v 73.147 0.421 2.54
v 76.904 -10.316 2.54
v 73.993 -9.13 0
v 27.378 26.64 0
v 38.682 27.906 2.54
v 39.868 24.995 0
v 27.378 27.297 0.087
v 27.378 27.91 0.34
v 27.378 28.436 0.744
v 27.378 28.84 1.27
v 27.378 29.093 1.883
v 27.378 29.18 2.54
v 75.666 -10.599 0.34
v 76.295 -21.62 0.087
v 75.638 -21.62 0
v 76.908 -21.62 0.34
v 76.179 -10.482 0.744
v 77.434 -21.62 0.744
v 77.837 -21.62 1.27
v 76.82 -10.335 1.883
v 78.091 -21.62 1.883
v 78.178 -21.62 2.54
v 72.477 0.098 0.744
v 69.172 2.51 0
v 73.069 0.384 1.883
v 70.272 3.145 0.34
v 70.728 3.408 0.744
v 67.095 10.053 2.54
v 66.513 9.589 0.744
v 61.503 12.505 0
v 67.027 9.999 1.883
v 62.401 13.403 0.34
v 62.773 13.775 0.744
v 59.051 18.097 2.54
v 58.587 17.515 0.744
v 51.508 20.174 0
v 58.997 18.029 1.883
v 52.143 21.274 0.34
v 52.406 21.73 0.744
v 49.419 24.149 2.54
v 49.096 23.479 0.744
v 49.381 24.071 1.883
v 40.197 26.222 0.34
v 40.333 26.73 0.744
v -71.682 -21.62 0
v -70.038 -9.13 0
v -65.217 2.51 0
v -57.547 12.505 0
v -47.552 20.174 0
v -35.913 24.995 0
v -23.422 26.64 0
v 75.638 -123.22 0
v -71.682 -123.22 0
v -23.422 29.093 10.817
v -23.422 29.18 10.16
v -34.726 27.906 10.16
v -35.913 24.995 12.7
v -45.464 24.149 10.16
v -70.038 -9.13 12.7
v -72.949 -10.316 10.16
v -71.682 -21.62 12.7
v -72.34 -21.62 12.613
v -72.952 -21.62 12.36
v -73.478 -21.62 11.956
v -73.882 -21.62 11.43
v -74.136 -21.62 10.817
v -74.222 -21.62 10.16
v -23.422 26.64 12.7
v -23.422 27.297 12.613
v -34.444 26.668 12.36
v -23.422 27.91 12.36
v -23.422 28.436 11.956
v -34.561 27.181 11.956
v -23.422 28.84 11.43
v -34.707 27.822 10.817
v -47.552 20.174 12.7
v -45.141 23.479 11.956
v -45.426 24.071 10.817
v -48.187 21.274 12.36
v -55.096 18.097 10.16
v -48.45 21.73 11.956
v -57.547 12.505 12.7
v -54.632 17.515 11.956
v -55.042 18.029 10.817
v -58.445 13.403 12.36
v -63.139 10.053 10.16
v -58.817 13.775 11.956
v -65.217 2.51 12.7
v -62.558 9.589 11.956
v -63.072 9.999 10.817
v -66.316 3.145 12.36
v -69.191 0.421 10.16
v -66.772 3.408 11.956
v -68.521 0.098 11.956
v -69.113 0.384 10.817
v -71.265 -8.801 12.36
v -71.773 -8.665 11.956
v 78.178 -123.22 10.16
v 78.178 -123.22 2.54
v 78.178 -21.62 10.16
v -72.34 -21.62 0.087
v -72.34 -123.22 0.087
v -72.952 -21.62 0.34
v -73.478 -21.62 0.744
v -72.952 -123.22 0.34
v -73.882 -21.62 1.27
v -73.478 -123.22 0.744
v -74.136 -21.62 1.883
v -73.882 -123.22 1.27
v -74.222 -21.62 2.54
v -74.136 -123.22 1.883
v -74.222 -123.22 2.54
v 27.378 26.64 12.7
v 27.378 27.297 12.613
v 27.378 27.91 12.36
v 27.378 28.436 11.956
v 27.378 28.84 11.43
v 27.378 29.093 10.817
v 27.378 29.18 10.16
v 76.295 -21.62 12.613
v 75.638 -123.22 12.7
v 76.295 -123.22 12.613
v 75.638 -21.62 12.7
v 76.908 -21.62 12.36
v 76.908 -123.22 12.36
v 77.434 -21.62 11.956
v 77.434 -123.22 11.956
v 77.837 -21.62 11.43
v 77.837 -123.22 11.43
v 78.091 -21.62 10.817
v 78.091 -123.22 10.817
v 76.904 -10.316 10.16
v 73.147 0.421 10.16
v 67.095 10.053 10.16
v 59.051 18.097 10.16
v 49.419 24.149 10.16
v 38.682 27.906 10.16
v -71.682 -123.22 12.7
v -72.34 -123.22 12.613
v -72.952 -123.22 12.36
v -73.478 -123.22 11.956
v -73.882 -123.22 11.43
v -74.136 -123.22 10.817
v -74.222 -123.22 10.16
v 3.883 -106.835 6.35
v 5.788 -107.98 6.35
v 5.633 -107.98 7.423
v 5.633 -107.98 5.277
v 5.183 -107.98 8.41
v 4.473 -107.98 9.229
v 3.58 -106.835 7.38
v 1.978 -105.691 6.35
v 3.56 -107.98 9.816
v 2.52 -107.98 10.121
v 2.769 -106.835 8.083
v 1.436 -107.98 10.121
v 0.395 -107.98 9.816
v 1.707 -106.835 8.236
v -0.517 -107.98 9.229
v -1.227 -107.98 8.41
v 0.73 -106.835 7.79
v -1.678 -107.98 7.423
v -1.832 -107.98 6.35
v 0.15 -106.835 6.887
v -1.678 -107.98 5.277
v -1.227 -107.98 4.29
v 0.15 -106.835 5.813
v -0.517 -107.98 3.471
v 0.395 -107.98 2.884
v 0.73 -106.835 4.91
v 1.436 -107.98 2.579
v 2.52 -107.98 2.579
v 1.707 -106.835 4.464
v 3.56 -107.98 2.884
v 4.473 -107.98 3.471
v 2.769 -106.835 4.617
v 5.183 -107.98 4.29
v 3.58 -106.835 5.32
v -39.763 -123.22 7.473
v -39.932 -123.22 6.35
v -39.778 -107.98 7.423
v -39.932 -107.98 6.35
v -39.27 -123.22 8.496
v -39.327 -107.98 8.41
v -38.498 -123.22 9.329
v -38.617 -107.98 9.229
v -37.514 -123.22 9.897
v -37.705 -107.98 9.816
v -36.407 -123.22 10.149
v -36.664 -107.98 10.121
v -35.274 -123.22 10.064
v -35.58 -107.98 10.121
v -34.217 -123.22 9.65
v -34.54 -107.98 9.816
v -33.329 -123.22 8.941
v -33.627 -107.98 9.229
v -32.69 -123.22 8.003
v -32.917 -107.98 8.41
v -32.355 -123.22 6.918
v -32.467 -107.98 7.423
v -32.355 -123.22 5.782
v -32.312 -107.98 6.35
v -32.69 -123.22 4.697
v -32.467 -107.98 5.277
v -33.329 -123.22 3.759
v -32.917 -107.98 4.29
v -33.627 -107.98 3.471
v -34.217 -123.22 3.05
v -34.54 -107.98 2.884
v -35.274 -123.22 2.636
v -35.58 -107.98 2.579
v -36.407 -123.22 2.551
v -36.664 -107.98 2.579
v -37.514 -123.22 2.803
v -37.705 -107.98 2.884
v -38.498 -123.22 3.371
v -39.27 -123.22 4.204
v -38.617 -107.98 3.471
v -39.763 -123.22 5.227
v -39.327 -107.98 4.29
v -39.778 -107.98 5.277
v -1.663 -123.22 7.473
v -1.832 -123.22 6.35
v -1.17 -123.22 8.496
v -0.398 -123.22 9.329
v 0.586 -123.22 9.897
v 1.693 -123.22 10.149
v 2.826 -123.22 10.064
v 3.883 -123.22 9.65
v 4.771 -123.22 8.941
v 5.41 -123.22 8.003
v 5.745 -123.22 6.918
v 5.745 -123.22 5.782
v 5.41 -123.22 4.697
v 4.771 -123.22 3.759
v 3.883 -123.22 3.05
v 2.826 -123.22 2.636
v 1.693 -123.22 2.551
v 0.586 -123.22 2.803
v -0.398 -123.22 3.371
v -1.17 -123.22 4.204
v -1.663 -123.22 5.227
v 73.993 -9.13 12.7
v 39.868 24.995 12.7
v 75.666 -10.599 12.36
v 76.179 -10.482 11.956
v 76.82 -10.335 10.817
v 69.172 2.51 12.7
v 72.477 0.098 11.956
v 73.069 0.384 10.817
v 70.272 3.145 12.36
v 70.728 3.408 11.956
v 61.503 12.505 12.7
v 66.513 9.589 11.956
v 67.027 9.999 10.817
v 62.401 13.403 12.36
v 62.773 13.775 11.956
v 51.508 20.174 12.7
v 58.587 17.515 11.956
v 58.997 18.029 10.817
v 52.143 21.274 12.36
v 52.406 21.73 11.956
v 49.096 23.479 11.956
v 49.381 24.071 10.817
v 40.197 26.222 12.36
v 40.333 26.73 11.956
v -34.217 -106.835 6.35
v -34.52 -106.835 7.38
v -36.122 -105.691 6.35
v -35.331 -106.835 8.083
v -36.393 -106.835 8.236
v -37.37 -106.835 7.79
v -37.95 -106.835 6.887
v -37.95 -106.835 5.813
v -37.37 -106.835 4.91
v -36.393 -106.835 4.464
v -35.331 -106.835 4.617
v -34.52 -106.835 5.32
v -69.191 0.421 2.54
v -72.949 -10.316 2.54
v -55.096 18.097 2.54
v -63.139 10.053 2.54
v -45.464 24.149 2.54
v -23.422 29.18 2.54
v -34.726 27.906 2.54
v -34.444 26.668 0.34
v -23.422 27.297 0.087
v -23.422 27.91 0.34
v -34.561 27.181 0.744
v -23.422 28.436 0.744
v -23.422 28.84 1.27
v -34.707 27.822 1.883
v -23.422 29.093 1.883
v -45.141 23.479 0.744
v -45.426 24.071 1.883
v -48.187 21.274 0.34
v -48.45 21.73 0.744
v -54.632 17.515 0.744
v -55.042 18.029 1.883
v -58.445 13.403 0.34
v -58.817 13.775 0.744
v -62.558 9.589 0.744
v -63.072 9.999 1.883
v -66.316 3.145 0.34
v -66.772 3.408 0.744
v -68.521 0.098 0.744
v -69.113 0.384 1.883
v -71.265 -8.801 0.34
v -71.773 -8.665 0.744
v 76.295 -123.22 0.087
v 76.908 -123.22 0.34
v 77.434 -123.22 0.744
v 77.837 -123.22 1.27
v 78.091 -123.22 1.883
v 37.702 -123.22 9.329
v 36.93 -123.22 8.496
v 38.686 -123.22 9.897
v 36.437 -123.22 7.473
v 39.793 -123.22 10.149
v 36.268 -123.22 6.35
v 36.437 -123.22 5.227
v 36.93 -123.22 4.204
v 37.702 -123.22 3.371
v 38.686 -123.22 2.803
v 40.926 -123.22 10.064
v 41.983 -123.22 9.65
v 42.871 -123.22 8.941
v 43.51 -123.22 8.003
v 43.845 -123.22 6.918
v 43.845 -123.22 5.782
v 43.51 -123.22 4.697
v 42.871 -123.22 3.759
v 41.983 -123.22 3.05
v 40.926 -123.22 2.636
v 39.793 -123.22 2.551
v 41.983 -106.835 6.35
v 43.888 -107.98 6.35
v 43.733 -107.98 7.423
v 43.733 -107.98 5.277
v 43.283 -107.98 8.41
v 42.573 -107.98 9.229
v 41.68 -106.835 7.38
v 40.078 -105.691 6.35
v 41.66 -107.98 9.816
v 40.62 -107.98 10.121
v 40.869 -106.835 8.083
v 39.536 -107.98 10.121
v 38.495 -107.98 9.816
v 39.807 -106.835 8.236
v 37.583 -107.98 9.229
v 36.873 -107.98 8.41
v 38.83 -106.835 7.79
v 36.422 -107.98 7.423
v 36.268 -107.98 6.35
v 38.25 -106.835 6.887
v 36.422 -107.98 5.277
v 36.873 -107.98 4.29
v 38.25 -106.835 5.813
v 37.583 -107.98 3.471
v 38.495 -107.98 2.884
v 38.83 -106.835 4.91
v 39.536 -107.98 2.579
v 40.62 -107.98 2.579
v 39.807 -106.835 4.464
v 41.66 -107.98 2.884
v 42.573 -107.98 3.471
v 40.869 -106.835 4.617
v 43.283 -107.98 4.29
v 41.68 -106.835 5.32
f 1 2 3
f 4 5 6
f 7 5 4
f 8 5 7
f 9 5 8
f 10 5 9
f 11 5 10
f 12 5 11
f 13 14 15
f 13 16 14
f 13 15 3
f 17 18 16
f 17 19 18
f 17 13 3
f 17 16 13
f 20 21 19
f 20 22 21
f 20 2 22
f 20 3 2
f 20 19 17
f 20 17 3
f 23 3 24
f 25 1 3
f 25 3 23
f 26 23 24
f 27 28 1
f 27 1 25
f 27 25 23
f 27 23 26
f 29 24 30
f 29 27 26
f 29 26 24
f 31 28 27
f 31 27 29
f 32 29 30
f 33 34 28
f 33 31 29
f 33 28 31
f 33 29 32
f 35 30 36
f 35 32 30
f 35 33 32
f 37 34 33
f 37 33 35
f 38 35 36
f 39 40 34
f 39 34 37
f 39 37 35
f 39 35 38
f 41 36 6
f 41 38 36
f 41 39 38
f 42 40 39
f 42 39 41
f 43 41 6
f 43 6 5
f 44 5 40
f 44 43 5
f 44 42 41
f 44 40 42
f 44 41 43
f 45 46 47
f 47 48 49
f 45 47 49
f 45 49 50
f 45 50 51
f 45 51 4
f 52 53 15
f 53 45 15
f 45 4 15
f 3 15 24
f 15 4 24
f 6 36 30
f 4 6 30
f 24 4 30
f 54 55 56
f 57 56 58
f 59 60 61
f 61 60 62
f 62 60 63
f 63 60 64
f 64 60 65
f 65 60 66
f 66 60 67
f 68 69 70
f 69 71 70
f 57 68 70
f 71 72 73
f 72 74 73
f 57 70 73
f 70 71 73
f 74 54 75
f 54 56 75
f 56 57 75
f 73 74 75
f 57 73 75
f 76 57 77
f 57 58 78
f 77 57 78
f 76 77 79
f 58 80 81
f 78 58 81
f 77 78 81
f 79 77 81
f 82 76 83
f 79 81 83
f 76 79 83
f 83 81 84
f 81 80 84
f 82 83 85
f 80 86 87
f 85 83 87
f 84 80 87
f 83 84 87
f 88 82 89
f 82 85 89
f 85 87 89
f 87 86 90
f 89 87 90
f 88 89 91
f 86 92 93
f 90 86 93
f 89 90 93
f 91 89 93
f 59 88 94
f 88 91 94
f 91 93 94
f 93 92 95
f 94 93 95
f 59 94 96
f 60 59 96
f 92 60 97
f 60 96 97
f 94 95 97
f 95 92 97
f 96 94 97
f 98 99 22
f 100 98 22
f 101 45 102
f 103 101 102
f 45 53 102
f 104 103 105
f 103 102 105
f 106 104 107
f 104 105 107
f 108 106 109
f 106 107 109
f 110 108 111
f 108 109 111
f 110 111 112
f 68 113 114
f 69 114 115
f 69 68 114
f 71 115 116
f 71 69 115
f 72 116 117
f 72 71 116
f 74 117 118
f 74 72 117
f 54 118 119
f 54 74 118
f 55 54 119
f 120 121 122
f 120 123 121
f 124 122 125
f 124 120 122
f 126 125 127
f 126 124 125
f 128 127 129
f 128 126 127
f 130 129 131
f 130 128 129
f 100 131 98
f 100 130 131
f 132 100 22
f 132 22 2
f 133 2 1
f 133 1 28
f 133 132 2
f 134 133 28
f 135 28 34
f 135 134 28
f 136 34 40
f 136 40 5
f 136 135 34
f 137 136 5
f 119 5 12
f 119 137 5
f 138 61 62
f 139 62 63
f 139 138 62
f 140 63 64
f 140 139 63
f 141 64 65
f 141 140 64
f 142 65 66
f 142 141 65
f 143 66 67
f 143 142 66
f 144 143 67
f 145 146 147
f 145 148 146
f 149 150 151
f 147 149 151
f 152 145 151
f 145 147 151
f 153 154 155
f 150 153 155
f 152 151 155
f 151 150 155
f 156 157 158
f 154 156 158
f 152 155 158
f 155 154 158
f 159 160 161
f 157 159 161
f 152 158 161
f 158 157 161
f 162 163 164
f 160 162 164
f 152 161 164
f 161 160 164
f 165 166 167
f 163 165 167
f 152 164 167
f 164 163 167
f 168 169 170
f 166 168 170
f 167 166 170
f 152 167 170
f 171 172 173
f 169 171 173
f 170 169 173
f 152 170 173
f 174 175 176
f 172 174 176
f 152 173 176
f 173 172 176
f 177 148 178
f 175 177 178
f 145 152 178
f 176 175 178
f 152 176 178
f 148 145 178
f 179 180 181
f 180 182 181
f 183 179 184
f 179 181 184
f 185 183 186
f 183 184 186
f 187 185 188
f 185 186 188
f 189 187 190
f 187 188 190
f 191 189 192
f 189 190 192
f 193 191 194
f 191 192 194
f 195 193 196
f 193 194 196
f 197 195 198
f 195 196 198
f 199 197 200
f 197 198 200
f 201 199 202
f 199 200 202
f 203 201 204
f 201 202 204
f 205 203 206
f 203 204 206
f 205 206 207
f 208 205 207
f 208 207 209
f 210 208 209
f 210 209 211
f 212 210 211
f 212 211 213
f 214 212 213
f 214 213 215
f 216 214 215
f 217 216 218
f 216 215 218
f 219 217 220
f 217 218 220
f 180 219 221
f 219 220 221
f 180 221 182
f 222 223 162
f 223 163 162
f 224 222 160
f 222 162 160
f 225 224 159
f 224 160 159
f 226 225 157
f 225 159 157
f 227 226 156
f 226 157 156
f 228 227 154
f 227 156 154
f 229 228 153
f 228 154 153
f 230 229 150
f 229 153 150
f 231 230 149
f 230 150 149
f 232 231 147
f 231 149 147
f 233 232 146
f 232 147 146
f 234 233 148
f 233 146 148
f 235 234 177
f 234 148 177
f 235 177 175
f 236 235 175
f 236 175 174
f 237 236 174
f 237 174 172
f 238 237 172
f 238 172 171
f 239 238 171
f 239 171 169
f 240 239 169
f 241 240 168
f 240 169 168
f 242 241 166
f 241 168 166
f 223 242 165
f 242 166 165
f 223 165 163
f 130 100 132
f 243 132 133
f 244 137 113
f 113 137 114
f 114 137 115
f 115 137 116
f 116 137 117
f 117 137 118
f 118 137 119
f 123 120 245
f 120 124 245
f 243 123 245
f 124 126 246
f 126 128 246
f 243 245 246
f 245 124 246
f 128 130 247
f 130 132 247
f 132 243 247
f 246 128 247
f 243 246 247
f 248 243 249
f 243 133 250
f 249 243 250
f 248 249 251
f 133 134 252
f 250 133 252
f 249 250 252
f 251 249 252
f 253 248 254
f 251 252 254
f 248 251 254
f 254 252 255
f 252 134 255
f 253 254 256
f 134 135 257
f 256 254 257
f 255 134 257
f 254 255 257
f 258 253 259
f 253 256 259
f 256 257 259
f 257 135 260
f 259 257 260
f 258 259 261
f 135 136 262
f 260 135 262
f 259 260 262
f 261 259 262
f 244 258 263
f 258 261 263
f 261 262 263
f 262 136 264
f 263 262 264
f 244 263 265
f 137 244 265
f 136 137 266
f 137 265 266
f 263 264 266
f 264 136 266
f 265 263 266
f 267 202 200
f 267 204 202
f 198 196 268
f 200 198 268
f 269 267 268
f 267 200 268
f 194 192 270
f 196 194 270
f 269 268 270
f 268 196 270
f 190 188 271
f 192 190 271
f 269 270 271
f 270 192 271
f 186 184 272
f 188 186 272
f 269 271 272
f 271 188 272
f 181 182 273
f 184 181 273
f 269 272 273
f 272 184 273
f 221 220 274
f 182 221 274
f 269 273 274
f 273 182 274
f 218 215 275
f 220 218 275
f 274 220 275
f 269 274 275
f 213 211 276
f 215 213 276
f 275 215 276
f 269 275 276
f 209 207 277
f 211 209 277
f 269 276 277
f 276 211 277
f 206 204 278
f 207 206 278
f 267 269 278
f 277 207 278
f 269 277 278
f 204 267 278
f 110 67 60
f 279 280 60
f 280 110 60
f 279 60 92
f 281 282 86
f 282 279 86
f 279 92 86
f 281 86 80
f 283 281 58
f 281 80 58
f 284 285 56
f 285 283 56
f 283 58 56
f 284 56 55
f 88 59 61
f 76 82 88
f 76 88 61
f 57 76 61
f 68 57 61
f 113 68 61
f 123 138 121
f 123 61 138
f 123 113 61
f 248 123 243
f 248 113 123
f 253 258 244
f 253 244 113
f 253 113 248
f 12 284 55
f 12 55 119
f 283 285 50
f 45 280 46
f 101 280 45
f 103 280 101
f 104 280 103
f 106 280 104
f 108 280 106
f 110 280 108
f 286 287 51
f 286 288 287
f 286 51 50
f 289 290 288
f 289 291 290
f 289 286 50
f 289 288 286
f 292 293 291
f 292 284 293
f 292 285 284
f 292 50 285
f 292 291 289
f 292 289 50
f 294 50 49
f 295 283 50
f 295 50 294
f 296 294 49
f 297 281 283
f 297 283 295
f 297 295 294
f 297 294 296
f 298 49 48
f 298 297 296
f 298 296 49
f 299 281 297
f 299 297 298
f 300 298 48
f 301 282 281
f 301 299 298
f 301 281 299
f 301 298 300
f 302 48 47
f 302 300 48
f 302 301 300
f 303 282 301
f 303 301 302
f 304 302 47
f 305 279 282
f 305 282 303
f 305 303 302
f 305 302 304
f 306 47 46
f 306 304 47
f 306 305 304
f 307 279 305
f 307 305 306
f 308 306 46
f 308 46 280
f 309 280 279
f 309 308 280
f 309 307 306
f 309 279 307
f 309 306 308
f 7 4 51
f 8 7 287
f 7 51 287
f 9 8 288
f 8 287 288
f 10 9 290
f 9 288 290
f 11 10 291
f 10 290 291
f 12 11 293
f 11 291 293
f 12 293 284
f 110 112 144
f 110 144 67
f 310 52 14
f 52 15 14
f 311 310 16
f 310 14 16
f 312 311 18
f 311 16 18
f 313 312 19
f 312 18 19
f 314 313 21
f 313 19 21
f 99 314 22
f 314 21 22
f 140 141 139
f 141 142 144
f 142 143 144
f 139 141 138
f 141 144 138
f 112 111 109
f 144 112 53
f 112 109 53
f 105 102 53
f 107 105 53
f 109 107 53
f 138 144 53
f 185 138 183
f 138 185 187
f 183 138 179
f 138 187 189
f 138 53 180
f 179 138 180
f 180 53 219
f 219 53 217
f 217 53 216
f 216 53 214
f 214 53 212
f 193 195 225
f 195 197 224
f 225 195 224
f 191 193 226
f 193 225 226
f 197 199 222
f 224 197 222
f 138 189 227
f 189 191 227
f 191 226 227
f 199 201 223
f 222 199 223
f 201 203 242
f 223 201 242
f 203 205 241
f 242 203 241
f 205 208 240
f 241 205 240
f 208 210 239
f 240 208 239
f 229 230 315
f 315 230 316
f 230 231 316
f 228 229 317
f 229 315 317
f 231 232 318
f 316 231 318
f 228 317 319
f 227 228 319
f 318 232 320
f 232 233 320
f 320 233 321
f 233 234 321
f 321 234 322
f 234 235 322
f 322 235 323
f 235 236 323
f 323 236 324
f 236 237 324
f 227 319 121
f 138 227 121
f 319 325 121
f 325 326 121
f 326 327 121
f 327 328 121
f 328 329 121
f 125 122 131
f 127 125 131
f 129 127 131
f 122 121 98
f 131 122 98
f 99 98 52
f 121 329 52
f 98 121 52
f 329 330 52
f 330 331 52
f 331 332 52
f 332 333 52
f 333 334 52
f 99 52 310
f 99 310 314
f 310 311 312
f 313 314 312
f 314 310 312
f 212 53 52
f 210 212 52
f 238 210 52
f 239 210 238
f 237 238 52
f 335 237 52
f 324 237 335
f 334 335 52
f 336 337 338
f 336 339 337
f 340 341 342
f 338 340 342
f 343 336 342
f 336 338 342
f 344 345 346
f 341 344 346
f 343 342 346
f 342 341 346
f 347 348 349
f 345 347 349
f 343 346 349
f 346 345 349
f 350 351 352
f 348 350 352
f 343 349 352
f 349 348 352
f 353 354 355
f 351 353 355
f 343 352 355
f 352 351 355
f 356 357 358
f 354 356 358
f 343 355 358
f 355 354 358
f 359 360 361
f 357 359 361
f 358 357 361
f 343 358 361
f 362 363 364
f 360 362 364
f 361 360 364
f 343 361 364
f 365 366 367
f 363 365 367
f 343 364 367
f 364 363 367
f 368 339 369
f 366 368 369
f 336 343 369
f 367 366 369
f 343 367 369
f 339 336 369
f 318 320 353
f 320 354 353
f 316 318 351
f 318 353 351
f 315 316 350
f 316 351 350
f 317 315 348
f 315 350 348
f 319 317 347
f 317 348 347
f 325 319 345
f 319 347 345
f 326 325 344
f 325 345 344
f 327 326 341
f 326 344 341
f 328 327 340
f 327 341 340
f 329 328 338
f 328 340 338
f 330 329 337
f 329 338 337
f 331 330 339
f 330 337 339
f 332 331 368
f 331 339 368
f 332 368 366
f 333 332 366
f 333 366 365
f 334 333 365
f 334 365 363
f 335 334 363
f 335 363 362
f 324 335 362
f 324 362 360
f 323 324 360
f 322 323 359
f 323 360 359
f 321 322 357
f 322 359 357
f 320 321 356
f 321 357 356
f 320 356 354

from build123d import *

# Parameters (mm, degrees)
F0_W     = 152.4
F0_H     = 152.4
F1_DEPTH = 12.7
F2_R     = 50.8
F4_D     = 7.62
F4_DEPTH = 15.24
F4_TIP   = 2.2892789585
F5_R     = 2.54


with BuildPart() as f1:
    # F0 (on Top) → F1 (new body)
    with BuildSketch(Plane.XY):
        with Locations((1.9777435809, -47.0201134945)):
            Rectangle(F0_W, F0_H)
    extrude(amount=F1_DEPTH)

    # F2
    f2_edges = [f1.edges().sort_by_distance(p)[0] for p in [
        (-74.222256, 29.179887, 6.35),
        (78.177744, 29.179887, 6.35),
    ]]
    fillet(f2_edges, radius=F2_R)

    # F4
    with Locations(Plane.XZ.offset(123.2201134945)):
        with Locations((40.0777435809, 6.35), (1.9777435809, 6.35), (-36.1222564191, 6.35)):
            Hole(F4_D / 2, depth=F4_DEPTH)
            with Locations((0, 0, -(F4_DEPTH + F4_TIP / 2))):  # 118° drill point
                Cone(0, F4_D / 2, F4_TIP, mode=Mode.SUBTRACT)

    # F5
    f5_edges = [f1.edges().sort_by_distance(p)[0] for p in [
        (78.177744, -72.420113, 12.7),
        (78.177744, -72.420113, 0),
    ]]
    fillet(f5_edges, radius=F5_R)


solid = f1.part
